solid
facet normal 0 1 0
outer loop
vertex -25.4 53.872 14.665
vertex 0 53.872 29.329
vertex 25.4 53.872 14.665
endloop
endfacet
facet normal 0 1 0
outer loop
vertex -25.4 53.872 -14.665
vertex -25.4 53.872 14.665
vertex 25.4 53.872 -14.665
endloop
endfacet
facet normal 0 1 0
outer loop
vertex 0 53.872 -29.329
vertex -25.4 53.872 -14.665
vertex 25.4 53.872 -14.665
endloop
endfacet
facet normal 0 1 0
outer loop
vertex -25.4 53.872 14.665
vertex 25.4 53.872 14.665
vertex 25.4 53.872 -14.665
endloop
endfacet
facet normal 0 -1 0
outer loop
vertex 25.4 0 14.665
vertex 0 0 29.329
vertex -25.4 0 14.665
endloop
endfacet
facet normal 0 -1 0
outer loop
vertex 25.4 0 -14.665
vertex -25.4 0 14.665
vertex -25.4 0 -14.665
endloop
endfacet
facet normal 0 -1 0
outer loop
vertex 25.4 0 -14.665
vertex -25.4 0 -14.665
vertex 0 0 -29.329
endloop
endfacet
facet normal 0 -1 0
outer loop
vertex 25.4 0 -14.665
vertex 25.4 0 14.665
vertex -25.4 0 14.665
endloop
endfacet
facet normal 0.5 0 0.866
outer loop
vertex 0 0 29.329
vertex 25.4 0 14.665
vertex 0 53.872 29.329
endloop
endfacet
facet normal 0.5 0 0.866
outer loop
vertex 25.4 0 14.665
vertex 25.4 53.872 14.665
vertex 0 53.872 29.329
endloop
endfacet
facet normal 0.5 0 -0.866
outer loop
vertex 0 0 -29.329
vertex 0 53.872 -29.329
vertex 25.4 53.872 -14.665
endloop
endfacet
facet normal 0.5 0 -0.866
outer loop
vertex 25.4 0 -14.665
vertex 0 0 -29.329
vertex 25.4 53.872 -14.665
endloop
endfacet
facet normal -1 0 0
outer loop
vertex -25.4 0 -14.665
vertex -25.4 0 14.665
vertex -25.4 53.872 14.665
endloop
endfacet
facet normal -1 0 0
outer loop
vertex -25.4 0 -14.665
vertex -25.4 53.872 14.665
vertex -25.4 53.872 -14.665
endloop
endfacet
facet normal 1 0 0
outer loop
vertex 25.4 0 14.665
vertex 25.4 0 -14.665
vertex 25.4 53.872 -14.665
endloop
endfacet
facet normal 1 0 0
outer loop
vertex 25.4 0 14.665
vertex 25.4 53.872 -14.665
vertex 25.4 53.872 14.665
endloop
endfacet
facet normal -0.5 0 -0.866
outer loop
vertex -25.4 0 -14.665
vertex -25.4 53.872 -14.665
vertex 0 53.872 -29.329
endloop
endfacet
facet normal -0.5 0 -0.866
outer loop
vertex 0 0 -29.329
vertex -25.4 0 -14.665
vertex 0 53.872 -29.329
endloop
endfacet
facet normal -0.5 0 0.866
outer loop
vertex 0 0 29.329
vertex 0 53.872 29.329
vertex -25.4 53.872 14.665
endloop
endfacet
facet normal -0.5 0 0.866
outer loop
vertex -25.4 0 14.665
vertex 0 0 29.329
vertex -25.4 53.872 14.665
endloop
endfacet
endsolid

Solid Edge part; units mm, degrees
sketch "Sketch1" plane through (0, 0, 0) normal (1, 0, 0) x (0, 1, 0)
  line L0 (0, 0) -> (53.8724, 0)
sketch "Sketch2" plane through (0, 0, 0) normal (0, -1, 0) x (1, 0, 0)
  line L0 (-25.4, -14.6647) -> (0, -29.3294)
  line L1 (0, -29.3294) -> (25.4, -14.6647)
  line L2 (25.4, -14.6647) -> (25.4, 14.6647)
  line L3 (25.4, 14.6647) -> (0, 29.3294)
  line L4 (0, 29.3294) -> (-25.4, 14.6647)
  line L5 (-25.4, 14.6647) -> (-25.4, -14.6647)
  dimension "D1" = 50.8
sweep "Protrusion_1" add profiles "Sketch2" path "Sketch1"
